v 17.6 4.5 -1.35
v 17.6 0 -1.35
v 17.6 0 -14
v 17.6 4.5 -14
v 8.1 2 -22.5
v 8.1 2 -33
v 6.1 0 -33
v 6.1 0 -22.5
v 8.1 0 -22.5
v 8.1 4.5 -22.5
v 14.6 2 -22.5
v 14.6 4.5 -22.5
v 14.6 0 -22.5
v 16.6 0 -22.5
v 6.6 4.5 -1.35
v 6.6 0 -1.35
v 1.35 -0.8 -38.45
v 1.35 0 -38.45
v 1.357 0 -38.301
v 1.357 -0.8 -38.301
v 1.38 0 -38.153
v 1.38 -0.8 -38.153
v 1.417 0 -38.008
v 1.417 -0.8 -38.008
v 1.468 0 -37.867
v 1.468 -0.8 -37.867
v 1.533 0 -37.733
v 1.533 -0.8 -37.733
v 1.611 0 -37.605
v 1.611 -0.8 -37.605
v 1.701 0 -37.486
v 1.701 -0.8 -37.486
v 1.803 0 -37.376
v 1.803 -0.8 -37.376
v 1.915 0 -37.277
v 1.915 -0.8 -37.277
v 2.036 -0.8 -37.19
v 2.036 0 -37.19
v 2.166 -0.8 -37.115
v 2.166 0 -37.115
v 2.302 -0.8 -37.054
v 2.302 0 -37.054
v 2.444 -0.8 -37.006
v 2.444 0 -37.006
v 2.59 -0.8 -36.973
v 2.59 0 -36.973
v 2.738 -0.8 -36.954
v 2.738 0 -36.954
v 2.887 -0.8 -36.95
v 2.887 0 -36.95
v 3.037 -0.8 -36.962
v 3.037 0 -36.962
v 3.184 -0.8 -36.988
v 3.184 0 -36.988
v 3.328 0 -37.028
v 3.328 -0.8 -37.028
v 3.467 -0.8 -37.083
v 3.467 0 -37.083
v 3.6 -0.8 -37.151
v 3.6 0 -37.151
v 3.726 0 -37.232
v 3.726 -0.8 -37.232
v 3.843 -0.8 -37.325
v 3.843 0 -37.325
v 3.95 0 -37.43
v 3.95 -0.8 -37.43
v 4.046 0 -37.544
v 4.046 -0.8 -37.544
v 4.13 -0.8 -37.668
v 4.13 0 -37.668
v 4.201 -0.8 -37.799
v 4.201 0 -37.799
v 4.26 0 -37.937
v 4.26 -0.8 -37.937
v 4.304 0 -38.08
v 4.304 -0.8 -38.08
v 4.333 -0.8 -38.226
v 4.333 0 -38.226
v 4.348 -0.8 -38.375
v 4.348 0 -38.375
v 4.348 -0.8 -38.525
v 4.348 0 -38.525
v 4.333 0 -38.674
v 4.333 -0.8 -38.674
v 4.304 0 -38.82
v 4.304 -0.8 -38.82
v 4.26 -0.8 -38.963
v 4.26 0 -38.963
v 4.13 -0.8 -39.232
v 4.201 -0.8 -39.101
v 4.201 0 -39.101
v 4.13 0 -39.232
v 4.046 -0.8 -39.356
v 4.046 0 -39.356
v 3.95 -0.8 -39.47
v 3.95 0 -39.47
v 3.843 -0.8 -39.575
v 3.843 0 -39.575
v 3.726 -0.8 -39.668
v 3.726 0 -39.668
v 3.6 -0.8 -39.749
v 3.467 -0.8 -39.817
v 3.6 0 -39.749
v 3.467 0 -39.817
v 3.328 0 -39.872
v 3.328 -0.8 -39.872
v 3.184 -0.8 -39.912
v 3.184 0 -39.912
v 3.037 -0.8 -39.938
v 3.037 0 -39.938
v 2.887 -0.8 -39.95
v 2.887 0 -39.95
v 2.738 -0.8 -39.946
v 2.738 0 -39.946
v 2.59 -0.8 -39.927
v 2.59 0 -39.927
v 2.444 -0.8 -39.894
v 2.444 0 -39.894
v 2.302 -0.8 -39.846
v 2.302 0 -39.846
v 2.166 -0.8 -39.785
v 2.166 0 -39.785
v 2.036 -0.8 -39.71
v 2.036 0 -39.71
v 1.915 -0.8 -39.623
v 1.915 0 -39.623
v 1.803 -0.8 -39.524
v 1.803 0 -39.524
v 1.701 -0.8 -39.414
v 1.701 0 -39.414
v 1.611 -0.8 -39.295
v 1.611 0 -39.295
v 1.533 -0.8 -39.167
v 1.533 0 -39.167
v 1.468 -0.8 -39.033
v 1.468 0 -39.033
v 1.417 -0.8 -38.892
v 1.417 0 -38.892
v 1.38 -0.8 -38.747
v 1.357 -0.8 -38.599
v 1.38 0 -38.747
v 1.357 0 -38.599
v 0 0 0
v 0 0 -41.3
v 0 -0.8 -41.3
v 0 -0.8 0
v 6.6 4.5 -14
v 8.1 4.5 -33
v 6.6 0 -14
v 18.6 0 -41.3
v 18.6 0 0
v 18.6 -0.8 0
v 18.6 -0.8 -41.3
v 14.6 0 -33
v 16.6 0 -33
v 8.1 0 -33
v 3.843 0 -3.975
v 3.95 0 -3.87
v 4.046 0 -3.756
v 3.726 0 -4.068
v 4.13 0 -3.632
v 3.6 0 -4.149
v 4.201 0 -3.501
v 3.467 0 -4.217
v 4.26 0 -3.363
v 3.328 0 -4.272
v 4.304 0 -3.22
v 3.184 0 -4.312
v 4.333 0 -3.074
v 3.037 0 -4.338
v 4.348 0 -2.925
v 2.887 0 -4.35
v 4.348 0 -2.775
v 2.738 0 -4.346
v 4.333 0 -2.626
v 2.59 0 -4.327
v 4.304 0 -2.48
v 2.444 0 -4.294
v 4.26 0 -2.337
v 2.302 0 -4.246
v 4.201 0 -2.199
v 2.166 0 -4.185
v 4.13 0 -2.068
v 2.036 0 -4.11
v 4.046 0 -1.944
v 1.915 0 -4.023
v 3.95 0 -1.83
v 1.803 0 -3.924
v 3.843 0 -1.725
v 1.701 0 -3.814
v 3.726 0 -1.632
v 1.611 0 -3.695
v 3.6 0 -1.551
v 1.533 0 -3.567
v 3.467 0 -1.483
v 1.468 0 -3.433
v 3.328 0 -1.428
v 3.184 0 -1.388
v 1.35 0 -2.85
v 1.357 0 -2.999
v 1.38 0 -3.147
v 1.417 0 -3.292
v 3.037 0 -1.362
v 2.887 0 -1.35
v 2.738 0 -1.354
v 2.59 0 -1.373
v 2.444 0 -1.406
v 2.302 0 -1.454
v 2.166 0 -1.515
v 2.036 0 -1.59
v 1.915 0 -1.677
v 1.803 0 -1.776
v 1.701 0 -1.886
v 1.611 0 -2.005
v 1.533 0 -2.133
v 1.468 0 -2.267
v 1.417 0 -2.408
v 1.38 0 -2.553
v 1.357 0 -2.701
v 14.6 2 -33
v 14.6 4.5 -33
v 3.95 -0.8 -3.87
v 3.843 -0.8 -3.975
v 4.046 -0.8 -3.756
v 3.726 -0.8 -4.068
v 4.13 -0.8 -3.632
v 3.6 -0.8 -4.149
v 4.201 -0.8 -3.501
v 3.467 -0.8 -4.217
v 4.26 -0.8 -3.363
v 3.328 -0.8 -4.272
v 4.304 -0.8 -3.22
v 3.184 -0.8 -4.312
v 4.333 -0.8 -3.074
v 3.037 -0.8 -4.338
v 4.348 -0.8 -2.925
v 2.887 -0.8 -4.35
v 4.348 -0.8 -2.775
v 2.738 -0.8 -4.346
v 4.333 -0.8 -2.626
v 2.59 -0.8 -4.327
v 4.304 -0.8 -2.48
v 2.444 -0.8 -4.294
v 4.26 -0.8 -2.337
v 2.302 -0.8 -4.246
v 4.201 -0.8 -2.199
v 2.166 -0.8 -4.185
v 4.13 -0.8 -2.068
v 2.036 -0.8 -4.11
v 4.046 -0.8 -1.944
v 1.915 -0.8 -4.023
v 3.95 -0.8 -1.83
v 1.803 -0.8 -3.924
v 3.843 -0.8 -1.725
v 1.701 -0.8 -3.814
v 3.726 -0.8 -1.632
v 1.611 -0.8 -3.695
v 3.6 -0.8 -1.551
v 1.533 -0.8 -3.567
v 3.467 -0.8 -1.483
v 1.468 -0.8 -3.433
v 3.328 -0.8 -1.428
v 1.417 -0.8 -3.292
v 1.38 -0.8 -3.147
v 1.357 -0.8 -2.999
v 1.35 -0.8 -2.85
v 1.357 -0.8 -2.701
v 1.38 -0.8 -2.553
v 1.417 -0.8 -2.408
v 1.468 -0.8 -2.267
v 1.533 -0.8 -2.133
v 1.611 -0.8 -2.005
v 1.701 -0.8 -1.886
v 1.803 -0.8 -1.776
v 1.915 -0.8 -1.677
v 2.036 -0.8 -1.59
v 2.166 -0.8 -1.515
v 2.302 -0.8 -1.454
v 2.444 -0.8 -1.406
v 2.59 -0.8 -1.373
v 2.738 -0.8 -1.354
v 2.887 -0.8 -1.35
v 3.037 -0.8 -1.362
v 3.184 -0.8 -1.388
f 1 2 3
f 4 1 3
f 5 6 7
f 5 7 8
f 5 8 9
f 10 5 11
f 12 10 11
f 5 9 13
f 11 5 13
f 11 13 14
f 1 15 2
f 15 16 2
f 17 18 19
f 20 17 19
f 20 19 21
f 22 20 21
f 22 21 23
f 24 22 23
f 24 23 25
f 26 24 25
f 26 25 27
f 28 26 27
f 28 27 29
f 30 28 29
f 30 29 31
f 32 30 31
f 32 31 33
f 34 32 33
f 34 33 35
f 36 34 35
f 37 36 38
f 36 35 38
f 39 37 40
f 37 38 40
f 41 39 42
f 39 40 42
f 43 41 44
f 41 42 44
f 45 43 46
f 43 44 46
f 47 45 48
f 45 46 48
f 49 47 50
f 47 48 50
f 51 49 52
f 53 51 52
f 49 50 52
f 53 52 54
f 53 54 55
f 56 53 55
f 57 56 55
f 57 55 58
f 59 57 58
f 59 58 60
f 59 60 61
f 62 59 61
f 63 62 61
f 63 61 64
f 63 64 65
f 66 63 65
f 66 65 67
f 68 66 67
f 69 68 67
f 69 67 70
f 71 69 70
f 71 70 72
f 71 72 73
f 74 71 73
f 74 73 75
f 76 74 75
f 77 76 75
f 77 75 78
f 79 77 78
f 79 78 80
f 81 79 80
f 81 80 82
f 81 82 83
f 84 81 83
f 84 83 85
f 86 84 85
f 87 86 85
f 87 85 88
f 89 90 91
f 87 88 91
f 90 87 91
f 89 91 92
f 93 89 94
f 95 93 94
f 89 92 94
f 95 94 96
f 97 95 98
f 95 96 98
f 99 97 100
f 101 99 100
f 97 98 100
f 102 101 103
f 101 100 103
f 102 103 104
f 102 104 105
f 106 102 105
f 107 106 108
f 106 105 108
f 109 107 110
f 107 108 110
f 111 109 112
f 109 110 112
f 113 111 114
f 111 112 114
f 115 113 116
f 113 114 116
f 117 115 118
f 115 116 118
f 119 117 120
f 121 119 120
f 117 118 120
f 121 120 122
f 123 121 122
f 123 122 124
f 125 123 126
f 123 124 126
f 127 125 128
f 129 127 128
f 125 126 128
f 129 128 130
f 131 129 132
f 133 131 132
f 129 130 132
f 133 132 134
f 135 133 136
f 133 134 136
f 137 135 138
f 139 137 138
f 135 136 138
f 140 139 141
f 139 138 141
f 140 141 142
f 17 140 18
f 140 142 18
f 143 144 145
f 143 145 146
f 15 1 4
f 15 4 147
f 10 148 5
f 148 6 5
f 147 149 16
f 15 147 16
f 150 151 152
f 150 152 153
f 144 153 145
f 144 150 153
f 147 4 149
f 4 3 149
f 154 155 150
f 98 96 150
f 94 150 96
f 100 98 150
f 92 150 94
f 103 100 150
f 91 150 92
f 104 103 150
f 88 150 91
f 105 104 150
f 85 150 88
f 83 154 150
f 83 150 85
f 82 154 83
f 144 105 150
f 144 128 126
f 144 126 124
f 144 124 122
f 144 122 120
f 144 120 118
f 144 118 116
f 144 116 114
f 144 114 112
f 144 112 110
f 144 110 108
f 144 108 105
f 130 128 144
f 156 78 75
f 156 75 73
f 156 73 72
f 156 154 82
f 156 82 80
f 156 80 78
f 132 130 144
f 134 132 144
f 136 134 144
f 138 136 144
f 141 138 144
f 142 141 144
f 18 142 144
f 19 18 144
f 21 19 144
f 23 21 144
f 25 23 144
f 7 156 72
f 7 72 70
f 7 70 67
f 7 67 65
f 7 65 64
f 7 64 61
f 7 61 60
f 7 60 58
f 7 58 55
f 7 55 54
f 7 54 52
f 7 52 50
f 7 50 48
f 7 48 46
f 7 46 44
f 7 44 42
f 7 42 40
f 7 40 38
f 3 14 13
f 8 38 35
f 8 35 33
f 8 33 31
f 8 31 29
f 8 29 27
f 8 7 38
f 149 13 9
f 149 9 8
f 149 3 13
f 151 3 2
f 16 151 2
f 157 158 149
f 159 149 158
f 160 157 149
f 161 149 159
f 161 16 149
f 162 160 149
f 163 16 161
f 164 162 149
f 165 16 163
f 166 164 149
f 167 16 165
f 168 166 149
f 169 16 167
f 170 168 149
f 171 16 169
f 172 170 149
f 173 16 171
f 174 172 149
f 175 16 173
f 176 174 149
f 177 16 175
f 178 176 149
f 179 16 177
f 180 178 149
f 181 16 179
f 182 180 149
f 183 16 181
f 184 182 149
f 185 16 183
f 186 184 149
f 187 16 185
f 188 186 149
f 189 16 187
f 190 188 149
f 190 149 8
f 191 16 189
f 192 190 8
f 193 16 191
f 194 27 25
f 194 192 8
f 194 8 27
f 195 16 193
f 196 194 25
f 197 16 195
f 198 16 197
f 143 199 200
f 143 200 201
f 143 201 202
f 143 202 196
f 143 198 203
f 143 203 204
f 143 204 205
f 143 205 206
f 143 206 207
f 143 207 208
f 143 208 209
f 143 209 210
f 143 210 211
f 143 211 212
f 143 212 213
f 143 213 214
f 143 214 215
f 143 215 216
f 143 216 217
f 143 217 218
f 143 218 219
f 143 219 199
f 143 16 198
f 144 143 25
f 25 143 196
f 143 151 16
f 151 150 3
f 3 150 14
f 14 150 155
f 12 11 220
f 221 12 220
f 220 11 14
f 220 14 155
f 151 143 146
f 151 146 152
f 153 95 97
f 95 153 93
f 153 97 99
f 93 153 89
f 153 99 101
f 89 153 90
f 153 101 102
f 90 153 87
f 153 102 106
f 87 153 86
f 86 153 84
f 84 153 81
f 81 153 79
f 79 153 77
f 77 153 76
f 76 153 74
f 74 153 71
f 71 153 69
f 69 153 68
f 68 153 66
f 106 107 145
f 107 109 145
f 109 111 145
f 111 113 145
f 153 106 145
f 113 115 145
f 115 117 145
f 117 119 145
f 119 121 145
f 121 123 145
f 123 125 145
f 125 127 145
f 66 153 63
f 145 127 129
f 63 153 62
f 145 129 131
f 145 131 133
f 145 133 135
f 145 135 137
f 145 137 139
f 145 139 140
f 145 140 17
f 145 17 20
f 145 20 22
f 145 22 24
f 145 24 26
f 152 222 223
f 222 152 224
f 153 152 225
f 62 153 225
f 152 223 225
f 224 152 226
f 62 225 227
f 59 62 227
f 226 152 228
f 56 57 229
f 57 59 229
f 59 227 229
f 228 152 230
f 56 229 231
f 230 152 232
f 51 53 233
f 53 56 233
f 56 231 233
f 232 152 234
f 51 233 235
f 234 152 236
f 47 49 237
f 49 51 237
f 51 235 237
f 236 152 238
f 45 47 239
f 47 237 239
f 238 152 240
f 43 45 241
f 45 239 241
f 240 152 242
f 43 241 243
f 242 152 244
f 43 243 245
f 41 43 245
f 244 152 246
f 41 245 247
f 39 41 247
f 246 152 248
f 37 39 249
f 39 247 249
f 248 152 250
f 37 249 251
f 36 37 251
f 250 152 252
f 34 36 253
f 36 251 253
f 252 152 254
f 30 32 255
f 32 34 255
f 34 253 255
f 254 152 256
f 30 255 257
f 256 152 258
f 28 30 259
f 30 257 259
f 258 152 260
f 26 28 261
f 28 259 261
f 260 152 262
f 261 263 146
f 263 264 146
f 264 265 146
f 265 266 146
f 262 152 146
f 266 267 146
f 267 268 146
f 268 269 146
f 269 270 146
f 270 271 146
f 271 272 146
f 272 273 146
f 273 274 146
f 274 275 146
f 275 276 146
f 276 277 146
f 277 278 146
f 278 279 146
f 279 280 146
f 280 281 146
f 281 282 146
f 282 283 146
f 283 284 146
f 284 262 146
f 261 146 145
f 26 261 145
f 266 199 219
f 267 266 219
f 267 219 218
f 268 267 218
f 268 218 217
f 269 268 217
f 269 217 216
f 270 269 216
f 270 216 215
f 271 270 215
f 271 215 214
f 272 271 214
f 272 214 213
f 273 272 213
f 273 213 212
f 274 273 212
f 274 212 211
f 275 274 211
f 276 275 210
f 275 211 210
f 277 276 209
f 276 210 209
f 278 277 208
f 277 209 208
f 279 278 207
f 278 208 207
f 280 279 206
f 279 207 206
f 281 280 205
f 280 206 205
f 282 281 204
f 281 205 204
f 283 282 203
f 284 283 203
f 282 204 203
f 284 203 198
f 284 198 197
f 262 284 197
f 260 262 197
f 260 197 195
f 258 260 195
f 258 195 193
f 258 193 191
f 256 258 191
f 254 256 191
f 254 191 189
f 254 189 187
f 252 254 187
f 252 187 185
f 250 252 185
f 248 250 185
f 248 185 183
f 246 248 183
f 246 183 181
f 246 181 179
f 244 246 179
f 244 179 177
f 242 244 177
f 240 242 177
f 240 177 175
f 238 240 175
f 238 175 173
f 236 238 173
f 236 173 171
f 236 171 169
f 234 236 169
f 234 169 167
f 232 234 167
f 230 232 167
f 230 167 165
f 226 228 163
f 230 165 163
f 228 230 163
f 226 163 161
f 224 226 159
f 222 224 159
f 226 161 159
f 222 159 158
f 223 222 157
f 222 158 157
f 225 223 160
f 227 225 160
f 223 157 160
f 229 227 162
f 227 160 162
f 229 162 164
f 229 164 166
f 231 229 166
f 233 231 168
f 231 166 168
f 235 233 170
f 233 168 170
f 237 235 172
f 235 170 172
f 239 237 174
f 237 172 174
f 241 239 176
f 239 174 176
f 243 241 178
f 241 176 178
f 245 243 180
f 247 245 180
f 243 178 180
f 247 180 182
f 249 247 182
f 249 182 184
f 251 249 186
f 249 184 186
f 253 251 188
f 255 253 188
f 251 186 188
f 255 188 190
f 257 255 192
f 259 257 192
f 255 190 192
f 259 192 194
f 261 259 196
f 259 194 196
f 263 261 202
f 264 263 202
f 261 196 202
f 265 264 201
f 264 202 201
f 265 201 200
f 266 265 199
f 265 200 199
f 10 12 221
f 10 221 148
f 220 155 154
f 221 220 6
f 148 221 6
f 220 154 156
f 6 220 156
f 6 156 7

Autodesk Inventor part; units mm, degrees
ref_plane "YZ Plane" through (0, 0, 0) normal (1, 0, 0) x (0, 1, 0)
ref_plane "XZ Plane" through (0, 0, 0) normal (0, 1, 0) x (-1, 0, 0)
ref_plane "XY Plane" through (0, 0, 0) normal (0, 0, 1) x (1, 0, 0)
sketch "Sketch1" plane through (0, 0, 0) normal (0, 1, 0) x (-1, 0, 0)
  line L0 (0, 0) -> (-18.6, 0)
  line L1 (-18.6, 0) -> (-18.6, -41.3)
  line L2 (-18.6, -41.3) -> (0, -41.3)
  line L3 (0, -41.3) -> (0, 0)
  line L4 (-1.35, 0) -> (-1.35, -41.3)
  line L5 (0, -1.35) -> (-18.6, -1.35)
  line L6 (0, -39.95) -> (-18.6, -39.95)
  circle A0 centre (-2.85, -2.85) radius 1.5
  circle A1 centre (-2.85, -38.45) radius 1.5
  line L7 (-8.1, -22.5) -> (-14.6, -22.5)
  line L8 (-14.6, -22.5) -> (-14.6, -33)
  line L9 (-14.6, -33) -> (-8.1, -33)
  line L10 (-8.1, -33) -> (-8.1, -22.5)
  line L11 (-6.6, -1) -> (-17.6, -1)
  line L12 (-17.6, -1) -> (-17.6, -14)
  line L13 (-17.6, -14) -> (-6.6, -14)
  line L14 (-6.6, -14) -> (-6.6, -1)
  point P0 (-6.6, -1.35)
  point P1 (-17.6, -1.35)
  dimension "d0" = 18.6
  dimension "d1" = 41.3
  dimension "d2" = 1.35
  dimension "d3" = 1.35
  dimension "d4" = 1.35
  dimension "d5" = 3
  dimension "d6" = 3
  dimension "d7" = 6.5
  dimension "d8" = 10.5
  dimension "d11" = 8.1
  dimension "d12" = 8.3
  dimension "d13" = 11
  dimension "d14" = 13
  dimension "d16" = 1
  dimension "d17" = 1
extrude "Extrusion1" add sketch "Sketch1" against normal blind 0.8 contours L3 L5 L4 L0 | L4 L5 L14 L11 L12 L1 L0 | L3 L6 L4 L5 | L4 A0 L5 | L3 L2 L4 L6 | L5 L12 L13 L14 A0 L4 A1 L6 L1 | L6 A1 L4 | L4 L2 L1 L6 | L12 L11 L14 L5 | L5 L14 L13 L12 | L10 L9 L8 L7
extrude "Extrusion2" add sketch "Sketch1" along normal blind 4.5 contours L5 L14 L13 L12
extrude "Extrusion3" add sketch "Sketch1" along normal blind 4.5 contours L10 L9 L8 L7
chamfer "Chamfer1" distance 2 angle 45 2 edges at (8.1, 0, -27.75) (14.6, 0, -27.75)
properties part number "interface_board"
